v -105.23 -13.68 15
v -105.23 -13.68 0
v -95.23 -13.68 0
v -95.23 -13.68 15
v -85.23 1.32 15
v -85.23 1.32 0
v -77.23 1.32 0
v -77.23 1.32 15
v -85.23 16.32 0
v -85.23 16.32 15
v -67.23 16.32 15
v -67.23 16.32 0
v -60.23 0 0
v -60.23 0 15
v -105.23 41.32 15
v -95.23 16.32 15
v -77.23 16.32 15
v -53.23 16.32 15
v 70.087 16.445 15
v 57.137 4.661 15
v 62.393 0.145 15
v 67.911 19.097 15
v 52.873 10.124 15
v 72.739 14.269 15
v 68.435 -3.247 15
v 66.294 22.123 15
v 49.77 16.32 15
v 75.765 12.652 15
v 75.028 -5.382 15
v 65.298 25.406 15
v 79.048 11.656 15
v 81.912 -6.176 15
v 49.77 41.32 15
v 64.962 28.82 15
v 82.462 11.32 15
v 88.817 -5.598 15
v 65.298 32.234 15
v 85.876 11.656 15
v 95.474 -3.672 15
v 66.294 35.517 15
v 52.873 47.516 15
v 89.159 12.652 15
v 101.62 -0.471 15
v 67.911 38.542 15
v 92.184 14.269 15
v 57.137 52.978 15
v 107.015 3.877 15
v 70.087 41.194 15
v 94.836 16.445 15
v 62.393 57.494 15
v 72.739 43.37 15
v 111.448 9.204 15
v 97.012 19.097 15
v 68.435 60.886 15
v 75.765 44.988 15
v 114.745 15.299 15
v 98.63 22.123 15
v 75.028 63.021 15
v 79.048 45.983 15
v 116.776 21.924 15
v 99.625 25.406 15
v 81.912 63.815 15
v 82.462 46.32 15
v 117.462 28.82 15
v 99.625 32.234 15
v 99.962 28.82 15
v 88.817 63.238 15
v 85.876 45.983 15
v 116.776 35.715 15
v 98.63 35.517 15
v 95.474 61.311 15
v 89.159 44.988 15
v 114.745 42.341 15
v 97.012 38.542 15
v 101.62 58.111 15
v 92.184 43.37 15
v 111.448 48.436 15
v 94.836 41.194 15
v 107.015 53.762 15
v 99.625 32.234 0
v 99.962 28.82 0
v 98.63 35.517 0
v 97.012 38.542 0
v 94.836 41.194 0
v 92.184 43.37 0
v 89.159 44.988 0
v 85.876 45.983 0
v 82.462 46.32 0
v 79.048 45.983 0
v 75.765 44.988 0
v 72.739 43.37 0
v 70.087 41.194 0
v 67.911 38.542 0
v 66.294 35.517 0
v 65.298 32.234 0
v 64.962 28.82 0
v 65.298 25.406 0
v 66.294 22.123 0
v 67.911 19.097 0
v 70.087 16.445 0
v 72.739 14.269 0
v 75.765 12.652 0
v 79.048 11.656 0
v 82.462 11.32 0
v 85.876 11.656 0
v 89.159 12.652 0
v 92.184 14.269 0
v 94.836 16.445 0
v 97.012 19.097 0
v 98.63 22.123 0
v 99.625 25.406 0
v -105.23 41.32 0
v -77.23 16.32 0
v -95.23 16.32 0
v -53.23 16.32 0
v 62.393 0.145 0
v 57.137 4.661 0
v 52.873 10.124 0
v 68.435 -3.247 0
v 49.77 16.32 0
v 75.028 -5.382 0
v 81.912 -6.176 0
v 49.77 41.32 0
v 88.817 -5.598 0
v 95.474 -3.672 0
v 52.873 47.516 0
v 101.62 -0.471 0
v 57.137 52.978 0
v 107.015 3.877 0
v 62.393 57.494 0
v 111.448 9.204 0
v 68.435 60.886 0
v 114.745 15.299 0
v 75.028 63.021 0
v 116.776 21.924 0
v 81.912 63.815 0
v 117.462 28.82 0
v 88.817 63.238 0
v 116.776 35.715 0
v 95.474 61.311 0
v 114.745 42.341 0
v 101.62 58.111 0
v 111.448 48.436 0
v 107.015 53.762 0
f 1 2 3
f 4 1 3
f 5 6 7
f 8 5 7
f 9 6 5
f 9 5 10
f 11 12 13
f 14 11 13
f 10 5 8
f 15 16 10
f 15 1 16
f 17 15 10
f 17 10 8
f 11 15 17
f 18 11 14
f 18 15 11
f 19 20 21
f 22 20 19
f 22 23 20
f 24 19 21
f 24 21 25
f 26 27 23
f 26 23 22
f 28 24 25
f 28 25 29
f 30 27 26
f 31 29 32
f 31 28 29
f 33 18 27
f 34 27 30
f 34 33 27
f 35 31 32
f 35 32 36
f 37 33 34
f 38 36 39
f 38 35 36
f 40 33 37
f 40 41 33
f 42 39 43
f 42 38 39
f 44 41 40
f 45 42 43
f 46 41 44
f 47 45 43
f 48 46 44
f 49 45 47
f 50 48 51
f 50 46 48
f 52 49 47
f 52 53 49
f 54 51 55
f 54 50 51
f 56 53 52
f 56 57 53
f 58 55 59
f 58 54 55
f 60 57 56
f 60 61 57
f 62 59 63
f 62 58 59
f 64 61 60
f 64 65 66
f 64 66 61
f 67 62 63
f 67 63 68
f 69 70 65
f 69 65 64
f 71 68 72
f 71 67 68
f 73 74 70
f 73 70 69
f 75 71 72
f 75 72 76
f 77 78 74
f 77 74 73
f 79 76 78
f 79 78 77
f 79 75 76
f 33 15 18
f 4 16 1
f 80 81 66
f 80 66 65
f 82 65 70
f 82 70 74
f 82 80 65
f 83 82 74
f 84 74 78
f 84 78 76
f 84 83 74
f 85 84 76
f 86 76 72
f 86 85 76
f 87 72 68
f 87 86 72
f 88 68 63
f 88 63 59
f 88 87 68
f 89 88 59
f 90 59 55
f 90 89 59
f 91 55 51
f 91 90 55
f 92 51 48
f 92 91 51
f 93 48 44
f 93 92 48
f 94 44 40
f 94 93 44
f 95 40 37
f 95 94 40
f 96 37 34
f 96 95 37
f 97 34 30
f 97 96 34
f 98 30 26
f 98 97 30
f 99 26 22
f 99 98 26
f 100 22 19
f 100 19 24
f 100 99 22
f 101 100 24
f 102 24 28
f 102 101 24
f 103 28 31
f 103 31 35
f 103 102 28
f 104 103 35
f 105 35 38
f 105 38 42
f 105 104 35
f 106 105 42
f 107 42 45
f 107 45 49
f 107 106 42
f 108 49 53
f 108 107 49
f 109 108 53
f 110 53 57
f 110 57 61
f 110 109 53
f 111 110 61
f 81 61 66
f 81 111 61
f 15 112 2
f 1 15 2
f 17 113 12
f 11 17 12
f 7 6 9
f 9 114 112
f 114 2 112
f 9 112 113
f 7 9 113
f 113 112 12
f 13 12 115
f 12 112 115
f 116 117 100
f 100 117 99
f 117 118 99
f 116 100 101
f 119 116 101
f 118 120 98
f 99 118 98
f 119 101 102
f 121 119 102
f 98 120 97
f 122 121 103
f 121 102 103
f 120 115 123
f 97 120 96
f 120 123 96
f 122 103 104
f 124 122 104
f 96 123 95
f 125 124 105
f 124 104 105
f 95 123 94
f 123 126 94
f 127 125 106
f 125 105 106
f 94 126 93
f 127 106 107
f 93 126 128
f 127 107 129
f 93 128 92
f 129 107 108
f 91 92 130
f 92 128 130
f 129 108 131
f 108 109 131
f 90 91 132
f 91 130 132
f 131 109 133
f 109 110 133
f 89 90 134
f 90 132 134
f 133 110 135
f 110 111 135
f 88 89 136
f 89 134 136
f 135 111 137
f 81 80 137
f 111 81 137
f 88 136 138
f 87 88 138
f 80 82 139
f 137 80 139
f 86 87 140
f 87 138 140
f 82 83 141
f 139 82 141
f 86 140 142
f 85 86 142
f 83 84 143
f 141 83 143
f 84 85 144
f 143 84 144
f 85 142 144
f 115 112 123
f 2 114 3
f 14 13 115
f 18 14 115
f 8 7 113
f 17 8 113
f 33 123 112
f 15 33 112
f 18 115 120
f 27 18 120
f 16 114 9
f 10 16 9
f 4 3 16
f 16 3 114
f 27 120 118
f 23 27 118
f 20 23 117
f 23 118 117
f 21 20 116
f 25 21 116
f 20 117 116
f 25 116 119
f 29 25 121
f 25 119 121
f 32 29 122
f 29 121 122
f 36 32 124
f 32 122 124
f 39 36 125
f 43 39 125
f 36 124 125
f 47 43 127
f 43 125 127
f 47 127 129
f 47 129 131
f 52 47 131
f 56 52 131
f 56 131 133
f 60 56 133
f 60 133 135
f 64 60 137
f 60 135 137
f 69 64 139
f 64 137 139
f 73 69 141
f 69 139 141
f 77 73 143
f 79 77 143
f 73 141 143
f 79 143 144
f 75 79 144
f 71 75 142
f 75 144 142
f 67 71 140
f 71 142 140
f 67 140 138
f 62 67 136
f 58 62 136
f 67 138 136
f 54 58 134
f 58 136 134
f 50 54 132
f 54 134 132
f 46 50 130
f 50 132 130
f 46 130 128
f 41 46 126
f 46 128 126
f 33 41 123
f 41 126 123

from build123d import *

# Parameters (mm, degrees)
F0_R     = 17.5
F0_W     = 10
F0_H     = 30
F0_W_2   = 8
F0_H_2   = 15
F1_DEPTH = 15


with BuildPart() as f1:
    # F0 (on Top) → F1 (new body)
    with BuildSketch(Plane.XY):
        Polygon((49.769913, 41.319751), (-105.230087, 41.319751), (-105.230087, 16.319751), (-95.230087, 16.319751), (-85.230087, 16.319751), (-77.230087, 16.319751), (-67.230087, 16.319751), (-53.230087, 16.319751), (49.769913, 16.319751), align=None)
        with BuildLine():
            ThreePointArc((49.769913, 16.319751), (117.461655, 28.819751), (49.769913, 41.319751))
            Line((49.769913, 41.319751), (49.769913, 16.319751))
        make_face()
        with Locations((82.461655, 28.819751)):
            Circle(F0_R, mode=Mode.SUBTRACT)
        with Locations((-100.230087, 1.319751)):
            Rectangle(F0_W, F0_H)
        Polygon((-60.230087, 0), (-53.230087, 16.319751), (-67.230087, 16.319751), align=None)
        with Locations((-81.230087, 8.819751)):
            Rectangle(F0_W_2, F0_H_2)
    extrude(amount=F1_DEPTH)


solid = f1.part
